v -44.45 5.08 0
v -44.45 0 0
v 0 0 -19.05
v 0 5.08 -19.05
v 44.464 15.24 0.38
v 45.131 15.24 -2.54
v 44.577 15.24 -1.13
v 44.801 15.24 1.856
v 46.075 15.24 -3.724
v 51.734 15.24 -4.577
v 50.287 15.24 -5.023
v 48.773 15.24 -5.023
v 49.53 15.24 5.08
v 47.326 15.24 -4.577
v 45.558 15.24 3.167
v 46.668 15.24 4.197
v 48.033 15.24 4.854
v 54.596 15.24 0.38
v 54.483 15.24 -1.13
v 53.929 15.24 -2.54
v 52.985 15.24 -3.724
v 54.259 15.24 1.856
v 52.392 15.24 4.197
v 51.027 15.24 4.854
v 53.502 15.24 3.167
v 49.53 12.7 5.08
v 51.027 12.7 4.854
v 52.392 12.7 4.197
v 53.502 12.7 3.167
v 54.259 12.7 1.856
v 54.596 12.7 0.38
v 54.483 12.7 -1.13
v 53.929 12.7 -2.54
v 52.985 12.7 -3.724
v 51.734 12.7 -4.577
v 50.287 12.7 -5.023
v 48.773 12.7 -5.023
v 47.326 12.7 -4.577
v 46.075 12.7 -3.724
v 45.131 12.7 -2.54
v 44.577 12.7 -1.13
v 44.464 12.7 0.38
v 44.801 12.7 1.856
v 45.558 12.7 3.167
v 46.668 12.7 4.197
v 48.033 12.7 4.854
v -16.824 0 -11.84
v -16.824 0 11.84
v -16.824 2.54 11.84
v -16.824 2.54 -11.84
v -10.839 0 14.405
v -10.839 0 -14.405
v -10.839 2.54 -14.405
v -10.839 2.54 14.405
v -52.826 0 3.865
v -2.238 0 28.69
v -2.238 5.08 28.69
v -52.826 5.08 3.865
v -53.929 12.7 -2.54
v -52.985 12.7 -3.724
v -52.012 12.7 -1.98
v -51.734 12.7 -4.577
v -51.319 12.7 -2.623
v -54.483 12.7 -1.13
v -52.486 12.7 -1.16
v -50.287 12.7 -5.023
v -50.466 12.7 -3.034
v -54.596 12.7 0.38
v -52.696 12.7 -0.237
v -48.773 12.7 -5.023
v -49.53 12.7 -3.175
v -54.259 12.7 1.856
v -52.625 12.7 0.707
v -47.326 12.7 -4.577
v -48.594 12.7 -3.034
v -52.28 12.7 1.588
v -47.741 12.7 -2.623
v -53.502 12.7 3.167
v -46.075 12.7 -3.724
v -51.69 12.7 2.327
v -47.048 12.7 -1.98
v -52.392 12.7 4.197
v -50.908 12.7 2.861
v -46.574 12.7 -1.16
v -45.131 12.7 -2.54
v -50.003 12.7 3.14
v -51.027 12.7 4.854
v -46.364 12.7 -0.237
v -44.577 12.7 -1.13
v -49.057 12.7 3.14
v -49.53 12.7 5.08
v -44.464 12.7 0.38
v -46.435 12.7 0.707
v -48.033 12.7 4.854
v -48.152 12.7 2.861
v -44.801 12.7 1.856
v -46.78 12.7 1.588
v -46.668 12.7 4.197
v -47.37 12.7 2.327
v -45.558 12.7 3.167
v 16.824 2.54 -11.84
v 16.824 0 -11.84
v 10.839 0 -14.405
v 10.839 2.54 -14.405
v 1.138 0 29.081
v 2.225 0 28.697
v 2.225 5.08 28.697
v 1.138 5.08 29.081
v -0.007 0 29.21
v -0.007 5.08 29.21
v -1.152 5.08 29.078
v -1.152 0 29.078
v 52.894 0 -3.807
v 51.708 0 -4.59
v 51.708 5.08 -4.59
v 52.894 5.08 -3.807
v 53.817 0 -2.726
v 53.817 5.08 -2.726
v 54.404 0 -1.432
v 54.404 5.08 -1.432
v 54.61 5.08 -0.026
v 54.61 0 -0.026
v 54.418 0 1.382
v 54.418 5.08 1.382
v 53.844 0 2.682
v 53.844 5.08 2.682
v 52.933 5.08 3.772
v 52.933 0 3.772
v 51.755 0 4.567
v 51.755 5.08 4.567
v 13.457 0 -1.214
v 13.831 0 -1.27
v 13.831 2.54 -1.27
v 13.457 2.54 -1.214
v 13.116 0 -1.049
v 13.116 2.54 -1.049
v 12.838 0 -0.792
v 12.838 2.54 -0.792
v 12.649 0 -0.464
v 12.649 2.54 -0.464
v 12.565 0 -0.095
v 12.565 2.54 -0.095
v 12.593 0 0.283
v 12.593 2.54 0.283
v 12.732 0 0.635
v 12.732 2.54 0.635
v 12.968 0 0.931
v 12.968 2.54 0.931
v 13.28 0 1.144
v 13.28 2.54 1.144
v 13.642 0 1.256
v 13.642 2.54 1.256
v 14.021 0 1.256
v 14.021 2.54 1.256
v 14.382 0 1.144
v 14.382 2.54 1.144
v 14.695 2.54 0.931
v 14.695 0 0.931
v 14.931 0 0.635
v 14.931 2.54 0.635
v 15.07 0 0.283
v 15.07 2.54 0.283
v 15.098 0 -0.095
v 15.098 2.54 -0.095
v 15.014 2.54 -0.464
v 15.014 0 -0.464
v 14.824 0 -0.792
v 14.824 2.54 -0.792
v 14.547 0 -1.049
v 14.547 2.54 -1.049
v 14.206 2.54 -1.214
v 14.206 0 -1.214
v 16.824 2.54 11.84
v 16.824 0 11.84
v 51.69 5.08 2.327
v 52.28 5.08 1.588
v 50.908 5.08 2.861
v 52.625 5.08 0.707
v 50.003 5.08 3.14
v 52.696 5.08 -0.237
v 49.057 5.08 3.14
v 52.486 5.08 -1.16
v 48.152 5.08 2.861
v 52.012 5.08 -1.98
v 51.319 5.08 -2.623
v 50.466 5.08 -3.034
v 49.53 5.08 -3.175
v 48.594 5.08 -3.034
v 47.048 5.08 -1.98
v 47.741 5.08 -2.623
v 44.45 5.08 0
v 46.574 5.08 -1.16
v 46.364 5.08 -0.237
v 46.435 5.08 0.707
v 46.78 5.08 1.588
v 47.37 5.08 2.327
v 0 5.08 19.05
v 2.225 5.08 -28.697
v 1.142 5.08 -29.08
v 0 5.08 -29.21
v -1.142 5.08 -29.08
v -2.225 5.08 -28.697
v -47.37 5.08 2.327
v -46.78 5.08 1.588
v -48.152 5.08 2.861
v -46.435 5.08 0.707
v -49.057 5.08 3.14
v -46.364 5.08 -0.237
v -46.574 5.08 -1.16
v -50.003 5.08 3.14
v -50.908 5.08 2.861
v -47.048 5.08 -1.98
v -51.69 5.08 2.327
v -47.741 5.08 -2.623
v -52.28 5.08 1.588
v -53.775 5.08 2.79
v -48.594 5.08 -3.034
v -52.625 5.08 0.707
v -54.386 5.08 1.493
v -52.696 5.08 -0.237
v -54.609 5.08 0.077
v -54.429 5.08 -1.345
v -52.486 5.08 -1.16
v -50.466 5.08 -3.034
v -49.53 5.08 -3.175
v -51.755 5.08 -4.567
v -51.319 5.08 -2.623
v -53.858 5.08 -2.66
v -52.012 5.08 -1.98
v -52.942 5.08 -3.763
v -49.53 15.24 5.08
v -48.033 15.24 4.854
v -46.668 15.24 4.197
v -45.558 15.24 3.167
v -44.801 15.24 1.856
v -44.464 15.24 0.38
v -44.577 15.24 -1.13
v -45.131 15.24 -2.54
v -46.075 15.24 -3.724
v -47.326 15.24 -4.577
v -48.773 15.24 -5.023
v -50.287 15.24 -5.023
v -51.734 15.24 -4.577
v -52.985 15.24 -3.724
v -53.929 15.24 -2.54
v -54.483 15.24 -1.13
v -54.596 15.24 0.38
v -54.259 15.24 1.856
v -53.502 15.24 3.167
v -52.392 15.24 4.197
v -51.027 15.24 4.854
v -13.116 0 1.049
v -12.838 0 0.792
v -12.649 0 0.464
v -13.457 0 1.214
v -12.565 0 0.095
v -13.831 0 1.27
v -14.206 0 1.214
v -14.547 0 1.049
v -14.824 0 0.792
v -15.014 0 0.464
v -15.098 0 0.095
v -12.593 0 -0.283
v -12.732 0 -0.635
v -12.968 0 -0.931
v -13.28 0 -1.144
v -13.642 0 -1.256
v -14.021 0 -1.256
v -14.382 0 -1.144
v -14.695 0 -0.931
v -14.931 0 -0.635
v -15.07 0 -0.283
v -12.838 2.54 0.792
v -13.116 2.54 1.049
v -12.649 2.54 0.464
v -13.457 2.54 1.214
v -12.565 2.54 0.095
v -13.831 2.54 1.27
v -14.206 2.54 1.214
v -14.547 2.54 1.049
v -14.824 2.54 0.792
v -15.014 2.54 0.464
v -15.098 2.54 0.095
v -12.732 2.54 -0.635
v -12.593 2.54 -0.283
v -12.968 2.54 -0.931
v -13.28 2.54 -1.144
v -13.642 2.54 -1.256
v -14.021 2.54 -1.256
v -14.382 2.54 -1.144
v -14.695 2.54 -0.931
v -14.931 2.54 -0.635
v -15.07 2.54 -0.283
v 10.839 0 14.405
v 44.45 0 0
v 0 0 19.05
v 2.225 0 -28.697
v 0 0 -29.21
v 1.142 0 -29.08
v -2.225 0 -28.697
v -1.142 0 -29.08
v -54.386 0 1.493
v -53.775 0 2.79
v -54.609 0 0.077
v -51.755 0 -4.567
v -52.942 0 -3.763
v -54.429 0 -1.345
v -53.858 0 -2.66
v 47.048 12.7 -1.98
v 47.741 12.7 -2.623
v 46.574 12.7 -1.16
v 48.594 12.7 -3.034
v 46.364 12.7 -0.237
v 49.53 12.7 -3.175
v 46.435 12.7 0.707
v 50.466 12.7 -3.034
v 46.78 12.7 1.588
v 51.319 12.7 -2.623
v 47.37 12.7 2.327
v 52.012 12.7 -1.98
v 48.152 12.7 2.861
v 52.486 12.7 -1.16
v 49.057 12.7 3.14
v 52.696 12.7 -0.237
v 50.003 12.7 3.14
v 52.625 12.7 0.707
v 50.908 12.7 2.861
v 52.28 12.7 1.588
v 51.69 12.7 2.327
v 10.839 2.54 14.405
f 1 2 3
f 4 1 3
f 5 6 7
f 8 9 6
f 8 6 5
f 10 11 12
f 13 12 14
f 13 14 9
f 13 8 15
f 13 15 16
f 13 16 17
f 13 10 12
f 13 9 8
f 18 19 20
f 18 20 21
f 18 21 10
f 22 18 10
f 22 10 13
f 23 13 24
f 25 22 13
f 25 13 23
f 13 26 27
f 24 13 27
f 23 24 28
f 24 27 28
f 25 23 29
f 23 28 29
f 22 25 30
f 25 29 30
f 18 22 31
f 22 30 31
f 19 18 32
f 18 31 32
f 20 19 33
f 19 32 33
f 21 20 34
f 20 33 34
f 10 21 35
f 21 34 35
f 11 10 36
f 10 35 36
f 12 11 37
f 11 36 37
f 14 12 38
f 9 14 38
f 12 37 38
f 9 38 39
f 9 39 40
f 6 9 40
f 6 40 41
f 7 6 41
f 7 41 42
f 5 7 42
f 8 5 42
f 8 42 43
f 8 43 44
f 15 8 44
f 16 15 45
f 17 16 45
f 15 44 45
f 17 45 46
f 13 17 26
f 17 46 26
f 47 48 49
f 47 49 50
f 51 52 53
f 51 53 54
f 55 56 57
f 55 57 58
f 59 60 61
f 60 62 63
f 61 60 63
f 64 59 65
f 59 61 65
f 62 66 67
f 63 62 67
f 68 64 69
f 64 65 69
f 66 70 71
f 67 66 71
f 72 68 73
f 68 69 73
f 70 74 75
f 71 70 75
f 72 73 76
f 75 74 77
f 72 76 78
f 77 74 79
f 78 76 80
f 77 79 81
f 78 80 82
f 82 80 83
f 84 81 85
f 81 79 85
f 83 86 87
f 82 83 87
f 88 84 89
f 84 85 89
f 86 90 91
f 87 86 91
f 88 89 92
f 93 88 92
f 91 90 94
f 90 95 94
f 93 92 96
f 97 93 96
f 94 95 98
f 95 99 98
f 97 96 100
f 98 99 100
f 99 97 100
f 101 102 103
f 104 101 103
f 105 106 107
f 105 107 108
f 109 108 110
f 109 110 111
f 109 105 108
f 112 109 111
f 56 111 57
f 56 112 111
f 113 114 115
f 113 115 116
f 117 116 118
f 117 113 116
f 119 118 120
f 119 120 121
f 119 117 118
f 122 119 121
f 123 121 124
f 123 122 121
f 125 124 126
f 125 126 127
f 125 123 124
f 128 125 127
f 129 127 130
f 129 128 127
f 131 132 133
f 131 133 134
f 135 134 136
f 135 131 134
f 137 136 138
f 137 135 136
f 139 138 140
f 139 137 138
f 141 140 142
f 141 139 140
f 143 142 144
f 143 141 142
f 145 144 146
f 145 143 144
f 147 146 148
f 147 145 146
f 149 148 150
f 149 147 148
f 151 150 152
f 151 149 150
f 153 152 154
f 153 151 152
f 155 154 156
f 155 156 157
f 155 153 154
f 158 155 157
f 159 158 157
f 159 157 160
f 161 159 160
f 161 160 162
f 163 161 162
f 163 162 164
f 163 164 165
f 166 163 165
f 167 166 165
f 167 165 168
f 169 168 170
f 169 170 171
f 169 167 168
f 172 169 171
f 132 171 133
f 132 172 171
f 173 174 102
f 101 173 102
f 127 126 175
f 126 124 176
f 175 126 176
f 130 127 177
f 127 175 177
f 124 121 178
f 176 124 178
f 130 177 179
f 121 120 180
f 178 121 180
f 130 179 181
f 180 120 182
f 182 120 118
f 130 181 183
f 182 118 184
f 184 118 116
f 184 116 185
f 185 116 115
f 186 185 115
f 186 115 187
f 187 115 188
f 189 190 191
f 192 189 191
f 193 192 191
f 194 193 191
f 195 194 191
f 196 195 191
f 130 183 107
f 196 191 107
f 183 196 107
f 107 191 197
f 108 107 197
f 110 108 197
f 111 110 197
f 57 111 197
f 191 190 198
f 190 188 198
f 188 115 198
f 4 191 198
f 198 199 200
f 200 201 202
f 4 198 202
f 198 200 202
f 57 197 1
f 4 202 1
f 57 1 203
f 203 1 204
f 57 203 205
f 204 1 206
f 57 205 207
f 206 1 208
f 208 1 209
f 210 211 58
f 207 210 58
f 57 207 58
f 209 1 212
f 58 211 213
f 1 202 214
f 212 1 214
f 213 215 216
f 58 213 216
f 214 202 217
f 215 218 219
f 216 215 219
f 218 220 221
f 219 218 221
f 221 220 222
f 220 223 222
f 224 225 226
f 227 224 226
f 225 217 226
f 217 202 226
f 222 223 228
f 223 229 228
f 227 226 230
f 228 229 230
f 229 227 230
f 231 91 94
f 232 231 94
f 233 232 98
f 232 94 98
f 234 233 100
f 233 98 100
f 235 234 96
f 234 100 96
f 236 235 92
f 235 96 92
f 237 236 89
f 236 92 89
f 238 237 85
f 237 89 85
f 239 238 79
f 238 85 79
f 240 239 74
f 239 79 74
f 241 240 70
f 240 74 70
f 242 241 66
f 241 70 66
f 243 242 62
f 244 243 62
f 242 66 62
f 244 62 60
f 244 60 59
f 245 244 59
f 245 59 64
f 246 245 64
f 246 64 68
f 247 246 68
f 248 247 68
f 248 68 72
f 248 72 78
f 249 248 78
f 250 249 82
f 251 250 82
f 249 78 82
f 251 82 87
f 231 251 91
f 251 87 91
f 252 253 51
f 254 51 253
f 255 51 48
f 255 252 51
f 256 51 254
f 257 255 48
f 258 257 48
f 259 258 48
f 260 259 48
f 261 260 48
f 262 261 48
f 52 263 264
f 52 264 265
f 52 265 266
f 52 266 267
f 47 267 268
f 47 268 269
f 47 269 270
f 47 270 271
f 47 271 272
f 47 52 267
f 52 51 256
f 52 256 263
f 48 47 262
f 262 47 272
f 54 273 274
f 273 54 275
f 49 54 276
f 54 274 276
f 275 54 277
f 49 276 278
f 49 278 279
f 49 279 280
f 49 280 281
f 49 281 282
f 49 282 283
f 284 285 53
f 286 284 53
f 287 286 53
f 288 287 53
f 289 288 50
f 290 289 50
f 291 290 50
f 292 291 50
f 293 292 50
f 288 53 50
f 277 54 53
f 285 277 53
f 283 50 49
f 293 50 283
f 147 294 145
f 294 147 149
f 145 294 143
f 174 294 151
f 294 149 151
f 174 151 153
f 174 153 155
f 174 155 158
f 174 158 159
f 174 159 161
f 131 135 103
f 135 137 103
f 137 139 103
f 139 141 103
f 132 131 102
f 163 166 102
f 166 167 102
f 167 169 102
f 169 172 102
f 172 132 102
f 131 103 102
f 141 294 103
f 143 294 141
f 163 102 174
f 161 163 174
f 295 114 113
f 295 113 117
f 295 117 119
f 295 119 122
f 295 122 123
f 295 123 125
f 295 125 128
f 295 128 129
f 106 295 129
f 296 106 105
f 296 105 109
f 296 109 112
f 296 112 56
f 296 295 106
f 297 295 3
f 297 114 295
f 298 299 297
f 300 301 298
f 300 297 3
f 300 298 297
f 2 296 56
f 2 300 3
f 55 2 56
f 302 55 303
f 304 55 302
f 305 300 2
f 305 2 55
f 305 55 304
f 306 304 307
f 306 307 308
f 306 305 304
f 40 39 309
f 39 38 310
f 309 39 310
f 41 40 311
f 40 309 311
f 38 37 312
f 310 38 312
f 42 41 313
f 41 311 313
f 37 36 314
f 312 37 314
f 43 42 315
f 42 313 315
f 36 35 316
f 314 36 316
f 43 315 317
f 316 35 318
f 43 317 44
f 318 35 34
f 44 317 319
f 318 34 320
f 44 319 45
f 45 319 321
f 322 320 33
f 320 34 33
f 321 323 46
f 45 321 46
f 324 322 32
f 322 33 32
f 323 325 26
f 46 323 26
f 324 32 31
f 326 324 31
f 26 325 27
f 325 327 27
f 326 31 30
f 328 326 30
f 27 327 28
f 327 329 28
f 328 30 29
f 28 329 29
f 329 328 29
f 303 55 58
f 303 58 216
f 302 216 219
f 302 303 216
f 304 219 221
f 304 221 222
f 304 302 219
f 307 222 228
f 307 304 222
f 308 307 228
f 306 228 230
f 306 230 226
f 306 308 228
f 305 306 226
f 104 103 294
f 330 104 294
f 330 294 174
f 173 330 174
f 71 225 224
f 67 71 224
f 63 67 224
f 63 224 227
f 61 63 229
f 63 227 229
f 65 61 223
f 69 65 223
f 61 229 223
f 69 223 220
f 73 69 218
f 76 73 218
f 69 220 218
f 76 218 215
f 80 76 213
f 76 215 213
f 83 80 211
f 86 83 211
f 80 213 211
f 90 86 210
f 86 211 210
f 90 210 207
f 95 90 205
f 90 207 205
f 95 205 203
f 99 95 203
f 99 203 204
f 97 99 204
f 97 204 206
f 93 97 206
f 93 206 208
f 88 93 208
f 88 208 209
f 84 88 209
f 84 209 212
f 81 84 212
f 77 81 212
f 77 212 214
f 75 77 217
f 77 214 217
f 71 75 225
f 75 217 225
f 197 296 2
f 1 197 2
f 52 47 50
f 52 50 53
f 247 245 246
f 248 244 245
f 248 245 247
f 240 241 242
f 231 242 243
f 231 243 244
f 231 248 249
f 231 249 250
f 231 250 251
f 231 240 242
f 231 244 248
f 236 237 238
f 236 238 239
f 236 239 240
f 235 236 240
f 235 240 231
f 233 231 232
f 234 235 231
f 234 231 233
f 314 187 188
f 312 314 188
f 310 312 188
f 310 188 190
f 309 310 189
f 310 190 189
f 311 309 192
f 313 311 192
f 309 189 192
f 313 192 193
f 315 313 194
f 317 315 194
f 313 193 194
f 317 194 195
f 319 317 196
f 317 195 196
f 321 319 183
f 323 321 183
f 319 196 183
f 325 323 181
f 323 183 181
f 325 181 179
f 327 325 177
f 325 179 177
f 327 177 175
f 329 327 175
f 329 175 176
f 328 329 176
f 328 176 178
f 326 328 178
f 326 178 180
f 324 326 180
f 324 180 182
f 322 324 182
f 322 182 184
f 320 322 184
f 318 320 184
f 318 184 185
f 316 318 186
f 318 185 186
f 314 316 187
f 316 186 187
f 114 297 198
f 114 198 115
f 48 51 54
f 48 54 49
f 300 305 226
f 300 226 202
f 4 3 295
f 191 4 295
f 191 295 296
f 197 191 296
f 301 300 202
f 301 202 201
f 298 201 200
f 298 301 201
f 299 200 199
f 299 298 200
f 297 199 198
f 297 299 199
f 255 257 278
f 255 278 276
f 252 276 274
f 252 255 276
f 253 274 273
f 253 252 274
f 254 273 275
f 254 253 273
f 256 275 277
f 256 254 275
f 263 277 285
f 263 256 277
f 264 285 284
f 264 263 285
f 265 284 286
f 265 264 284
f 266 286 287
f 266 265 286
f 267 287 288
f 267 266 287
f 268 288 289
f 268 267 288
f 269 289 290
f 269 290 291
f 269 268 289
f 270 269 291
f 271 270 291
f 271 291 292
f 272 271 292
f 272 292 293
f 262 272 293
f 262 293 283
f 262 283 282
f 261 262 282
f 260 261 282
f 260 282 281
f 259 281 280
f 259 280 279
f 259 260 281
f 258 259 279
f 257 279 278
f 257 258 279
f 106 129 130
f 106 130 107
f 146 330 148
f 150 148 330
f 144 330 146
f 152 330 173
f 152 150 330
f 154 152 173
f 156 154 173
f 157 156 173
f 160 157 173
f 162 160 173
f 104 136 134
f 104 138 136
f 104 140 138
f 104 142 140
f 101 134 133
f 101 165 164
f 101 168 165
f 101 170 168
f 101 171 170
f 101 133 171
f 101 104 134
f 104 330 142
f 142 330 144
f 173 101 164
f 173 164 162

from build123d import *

# Parameters (mm, degrees)
BOSS_EXTRUDE1_DEPTH   = 5.08
SKETCH5_R             = 3.175
BOSS_EXTRUDE2_DEPTH   = 7.62
SKETCH12_R            = 5.08
BOSS_EXTRUDE4_DEPTH   = 2.54
SKETCH14_R            = 5.08
BOSS_EXTRUDE5_DEPTH   = 2.54
SKETCH15_R            = 1.27
BOSS_EXTRUDE6_DEPTH   = 2.54
BOSS_EXTRUDE6_2_DEPTH = 2.54


with BuildPart() as part:
    # Sketch4 → Boss-Extrude1 (new body)
    with BuildSketch(Plane(origin=(0, 0, 0), x_dir=(1, 0, 0), z_dir=(0, 1, 0))):
        with BuildLine():
            Line((-51.75488467, 4.566868534), (-2.22488467, 28.696868534))
            ThreePointArc((-2.22488467, 28.696868534), (1.2433e-05, 29.21), (2.224907024, 28.696857643))
            Line((2.224907024, 28.696857643), (51.70773276, 4.589540285))
            ThreePointArc((51.70773276, 4.589540285), (54.609932644, 0.026159658), (51.75488467, -4.566868534))
            Line((51.75488467, -4.566868534), (2.22488467, -28.696868534))
            ThreePointArc((2.22488467, -28.696868534), (-0.00727814, -29.209994786), (-2.237961471, -28.690474587))
            Line((-2.237961471, -28.690474587), (-52.826499461, -3.865163813))
            ThreePointArc((-52.826499461, -3.865163813), (-54.569465553, 0.640458386), (-51.75488467, 4.566868534))
        make_face()
        Polygon((-44.45, 0), (0, 19.05), (44.45, 0), (0, -19.05), align=None, mode=Mode.SUBTRACT)
    extrude(amount=BOSS_EXTRUDE1_DEPTH)

    # Sketch5 → Boss-Extrude2 (add)
    with BuildSketch(Plane(origin=(0, 5.08, 0), x_dir=(1, 0, 0), z_dir=(0, 1, 0))):
        with Locations(Location((-49.53, 0, 0), (0, 0, 90))):
            Circle(SKETCH5_R)
        with Locations(Location((49.53, 0, 0), (0, 0, 90))):
            Circle(SKETCH5_R)
    extrude(amount=BOSS_EXTRUDE2_DEPTH)

    # Sketch12 → Boss-Extrude4 (add)
    with BuildSketch(Plane(origin=(0, 12.7, 0), x_dir=(1, 0, 0), z_dir=(0, 1, 0))):
        with Locations(Location((49.53, 0, 0), (0, 0, 270))):
            Circle(SKETCH12_R)
    extrude(amount=BOSS_EXTRUDE4_DEPTH)

    # Sketch14 → Boss-Extrude5 (add)
    with BuildSketch(Plane(origin=(0, 12.7, 0), x_dir=(1, 0, 0), z_dir=(0, 1, 0))):
        with Locations(Location((-49.53, 0, 0), (0, 0, 270))):
            Circle(SKETCH14_R)
    extrude(amount=BOSS_EXTRUDE5_DEPTH)


with BuildPart() as body_2:
    # Sketch15 → Boss-Extrude6 (new body)
    with BuildSketch(Plane(origin=(0, 0, 0), x_dir=(1, 0, 0), z_dir=(0, 1, 0))):
        Polygon((-10.839034868, 14.404699342), (-10.839034868, -14.404699342), (-16.823699484, -11.839843078), (-16.823699484, 11.839843078), align=None)
        with Locations(Location((-13.831367176, 0, 0), (0, 0, 270))):
            Circle(SKETCH15_R, mode=Mode.SUBTRACT)
    extrude(amount=BOSS_EXTRUDE6_DEPTH)


with BuildPart() as body_3:
    # Sketch15 → Boss-Extrude6 2 (new body)
    with BuildSketch(Plane(origin=(0, 0, 0), x_dir=(1, 0, 0), z_dir=(0, 1, 0))):
        Polygon((16.823699484, 11.839843078), (10.839034868, 14.404699342), (10.839034868, -14.404699342), (16.823699484, -11.839843078), align=None)
        with Locations(Location((13.831367176, 0, 0), (0, 0, 90))):
            Circle(SKETCH15_R, mode=Mode.SUBTRACT)
    extrude(amount=BOSS_EXTRUDE6_2_DEPTH)


solid = Compound([part.part, body_2.part, body_3.part])
